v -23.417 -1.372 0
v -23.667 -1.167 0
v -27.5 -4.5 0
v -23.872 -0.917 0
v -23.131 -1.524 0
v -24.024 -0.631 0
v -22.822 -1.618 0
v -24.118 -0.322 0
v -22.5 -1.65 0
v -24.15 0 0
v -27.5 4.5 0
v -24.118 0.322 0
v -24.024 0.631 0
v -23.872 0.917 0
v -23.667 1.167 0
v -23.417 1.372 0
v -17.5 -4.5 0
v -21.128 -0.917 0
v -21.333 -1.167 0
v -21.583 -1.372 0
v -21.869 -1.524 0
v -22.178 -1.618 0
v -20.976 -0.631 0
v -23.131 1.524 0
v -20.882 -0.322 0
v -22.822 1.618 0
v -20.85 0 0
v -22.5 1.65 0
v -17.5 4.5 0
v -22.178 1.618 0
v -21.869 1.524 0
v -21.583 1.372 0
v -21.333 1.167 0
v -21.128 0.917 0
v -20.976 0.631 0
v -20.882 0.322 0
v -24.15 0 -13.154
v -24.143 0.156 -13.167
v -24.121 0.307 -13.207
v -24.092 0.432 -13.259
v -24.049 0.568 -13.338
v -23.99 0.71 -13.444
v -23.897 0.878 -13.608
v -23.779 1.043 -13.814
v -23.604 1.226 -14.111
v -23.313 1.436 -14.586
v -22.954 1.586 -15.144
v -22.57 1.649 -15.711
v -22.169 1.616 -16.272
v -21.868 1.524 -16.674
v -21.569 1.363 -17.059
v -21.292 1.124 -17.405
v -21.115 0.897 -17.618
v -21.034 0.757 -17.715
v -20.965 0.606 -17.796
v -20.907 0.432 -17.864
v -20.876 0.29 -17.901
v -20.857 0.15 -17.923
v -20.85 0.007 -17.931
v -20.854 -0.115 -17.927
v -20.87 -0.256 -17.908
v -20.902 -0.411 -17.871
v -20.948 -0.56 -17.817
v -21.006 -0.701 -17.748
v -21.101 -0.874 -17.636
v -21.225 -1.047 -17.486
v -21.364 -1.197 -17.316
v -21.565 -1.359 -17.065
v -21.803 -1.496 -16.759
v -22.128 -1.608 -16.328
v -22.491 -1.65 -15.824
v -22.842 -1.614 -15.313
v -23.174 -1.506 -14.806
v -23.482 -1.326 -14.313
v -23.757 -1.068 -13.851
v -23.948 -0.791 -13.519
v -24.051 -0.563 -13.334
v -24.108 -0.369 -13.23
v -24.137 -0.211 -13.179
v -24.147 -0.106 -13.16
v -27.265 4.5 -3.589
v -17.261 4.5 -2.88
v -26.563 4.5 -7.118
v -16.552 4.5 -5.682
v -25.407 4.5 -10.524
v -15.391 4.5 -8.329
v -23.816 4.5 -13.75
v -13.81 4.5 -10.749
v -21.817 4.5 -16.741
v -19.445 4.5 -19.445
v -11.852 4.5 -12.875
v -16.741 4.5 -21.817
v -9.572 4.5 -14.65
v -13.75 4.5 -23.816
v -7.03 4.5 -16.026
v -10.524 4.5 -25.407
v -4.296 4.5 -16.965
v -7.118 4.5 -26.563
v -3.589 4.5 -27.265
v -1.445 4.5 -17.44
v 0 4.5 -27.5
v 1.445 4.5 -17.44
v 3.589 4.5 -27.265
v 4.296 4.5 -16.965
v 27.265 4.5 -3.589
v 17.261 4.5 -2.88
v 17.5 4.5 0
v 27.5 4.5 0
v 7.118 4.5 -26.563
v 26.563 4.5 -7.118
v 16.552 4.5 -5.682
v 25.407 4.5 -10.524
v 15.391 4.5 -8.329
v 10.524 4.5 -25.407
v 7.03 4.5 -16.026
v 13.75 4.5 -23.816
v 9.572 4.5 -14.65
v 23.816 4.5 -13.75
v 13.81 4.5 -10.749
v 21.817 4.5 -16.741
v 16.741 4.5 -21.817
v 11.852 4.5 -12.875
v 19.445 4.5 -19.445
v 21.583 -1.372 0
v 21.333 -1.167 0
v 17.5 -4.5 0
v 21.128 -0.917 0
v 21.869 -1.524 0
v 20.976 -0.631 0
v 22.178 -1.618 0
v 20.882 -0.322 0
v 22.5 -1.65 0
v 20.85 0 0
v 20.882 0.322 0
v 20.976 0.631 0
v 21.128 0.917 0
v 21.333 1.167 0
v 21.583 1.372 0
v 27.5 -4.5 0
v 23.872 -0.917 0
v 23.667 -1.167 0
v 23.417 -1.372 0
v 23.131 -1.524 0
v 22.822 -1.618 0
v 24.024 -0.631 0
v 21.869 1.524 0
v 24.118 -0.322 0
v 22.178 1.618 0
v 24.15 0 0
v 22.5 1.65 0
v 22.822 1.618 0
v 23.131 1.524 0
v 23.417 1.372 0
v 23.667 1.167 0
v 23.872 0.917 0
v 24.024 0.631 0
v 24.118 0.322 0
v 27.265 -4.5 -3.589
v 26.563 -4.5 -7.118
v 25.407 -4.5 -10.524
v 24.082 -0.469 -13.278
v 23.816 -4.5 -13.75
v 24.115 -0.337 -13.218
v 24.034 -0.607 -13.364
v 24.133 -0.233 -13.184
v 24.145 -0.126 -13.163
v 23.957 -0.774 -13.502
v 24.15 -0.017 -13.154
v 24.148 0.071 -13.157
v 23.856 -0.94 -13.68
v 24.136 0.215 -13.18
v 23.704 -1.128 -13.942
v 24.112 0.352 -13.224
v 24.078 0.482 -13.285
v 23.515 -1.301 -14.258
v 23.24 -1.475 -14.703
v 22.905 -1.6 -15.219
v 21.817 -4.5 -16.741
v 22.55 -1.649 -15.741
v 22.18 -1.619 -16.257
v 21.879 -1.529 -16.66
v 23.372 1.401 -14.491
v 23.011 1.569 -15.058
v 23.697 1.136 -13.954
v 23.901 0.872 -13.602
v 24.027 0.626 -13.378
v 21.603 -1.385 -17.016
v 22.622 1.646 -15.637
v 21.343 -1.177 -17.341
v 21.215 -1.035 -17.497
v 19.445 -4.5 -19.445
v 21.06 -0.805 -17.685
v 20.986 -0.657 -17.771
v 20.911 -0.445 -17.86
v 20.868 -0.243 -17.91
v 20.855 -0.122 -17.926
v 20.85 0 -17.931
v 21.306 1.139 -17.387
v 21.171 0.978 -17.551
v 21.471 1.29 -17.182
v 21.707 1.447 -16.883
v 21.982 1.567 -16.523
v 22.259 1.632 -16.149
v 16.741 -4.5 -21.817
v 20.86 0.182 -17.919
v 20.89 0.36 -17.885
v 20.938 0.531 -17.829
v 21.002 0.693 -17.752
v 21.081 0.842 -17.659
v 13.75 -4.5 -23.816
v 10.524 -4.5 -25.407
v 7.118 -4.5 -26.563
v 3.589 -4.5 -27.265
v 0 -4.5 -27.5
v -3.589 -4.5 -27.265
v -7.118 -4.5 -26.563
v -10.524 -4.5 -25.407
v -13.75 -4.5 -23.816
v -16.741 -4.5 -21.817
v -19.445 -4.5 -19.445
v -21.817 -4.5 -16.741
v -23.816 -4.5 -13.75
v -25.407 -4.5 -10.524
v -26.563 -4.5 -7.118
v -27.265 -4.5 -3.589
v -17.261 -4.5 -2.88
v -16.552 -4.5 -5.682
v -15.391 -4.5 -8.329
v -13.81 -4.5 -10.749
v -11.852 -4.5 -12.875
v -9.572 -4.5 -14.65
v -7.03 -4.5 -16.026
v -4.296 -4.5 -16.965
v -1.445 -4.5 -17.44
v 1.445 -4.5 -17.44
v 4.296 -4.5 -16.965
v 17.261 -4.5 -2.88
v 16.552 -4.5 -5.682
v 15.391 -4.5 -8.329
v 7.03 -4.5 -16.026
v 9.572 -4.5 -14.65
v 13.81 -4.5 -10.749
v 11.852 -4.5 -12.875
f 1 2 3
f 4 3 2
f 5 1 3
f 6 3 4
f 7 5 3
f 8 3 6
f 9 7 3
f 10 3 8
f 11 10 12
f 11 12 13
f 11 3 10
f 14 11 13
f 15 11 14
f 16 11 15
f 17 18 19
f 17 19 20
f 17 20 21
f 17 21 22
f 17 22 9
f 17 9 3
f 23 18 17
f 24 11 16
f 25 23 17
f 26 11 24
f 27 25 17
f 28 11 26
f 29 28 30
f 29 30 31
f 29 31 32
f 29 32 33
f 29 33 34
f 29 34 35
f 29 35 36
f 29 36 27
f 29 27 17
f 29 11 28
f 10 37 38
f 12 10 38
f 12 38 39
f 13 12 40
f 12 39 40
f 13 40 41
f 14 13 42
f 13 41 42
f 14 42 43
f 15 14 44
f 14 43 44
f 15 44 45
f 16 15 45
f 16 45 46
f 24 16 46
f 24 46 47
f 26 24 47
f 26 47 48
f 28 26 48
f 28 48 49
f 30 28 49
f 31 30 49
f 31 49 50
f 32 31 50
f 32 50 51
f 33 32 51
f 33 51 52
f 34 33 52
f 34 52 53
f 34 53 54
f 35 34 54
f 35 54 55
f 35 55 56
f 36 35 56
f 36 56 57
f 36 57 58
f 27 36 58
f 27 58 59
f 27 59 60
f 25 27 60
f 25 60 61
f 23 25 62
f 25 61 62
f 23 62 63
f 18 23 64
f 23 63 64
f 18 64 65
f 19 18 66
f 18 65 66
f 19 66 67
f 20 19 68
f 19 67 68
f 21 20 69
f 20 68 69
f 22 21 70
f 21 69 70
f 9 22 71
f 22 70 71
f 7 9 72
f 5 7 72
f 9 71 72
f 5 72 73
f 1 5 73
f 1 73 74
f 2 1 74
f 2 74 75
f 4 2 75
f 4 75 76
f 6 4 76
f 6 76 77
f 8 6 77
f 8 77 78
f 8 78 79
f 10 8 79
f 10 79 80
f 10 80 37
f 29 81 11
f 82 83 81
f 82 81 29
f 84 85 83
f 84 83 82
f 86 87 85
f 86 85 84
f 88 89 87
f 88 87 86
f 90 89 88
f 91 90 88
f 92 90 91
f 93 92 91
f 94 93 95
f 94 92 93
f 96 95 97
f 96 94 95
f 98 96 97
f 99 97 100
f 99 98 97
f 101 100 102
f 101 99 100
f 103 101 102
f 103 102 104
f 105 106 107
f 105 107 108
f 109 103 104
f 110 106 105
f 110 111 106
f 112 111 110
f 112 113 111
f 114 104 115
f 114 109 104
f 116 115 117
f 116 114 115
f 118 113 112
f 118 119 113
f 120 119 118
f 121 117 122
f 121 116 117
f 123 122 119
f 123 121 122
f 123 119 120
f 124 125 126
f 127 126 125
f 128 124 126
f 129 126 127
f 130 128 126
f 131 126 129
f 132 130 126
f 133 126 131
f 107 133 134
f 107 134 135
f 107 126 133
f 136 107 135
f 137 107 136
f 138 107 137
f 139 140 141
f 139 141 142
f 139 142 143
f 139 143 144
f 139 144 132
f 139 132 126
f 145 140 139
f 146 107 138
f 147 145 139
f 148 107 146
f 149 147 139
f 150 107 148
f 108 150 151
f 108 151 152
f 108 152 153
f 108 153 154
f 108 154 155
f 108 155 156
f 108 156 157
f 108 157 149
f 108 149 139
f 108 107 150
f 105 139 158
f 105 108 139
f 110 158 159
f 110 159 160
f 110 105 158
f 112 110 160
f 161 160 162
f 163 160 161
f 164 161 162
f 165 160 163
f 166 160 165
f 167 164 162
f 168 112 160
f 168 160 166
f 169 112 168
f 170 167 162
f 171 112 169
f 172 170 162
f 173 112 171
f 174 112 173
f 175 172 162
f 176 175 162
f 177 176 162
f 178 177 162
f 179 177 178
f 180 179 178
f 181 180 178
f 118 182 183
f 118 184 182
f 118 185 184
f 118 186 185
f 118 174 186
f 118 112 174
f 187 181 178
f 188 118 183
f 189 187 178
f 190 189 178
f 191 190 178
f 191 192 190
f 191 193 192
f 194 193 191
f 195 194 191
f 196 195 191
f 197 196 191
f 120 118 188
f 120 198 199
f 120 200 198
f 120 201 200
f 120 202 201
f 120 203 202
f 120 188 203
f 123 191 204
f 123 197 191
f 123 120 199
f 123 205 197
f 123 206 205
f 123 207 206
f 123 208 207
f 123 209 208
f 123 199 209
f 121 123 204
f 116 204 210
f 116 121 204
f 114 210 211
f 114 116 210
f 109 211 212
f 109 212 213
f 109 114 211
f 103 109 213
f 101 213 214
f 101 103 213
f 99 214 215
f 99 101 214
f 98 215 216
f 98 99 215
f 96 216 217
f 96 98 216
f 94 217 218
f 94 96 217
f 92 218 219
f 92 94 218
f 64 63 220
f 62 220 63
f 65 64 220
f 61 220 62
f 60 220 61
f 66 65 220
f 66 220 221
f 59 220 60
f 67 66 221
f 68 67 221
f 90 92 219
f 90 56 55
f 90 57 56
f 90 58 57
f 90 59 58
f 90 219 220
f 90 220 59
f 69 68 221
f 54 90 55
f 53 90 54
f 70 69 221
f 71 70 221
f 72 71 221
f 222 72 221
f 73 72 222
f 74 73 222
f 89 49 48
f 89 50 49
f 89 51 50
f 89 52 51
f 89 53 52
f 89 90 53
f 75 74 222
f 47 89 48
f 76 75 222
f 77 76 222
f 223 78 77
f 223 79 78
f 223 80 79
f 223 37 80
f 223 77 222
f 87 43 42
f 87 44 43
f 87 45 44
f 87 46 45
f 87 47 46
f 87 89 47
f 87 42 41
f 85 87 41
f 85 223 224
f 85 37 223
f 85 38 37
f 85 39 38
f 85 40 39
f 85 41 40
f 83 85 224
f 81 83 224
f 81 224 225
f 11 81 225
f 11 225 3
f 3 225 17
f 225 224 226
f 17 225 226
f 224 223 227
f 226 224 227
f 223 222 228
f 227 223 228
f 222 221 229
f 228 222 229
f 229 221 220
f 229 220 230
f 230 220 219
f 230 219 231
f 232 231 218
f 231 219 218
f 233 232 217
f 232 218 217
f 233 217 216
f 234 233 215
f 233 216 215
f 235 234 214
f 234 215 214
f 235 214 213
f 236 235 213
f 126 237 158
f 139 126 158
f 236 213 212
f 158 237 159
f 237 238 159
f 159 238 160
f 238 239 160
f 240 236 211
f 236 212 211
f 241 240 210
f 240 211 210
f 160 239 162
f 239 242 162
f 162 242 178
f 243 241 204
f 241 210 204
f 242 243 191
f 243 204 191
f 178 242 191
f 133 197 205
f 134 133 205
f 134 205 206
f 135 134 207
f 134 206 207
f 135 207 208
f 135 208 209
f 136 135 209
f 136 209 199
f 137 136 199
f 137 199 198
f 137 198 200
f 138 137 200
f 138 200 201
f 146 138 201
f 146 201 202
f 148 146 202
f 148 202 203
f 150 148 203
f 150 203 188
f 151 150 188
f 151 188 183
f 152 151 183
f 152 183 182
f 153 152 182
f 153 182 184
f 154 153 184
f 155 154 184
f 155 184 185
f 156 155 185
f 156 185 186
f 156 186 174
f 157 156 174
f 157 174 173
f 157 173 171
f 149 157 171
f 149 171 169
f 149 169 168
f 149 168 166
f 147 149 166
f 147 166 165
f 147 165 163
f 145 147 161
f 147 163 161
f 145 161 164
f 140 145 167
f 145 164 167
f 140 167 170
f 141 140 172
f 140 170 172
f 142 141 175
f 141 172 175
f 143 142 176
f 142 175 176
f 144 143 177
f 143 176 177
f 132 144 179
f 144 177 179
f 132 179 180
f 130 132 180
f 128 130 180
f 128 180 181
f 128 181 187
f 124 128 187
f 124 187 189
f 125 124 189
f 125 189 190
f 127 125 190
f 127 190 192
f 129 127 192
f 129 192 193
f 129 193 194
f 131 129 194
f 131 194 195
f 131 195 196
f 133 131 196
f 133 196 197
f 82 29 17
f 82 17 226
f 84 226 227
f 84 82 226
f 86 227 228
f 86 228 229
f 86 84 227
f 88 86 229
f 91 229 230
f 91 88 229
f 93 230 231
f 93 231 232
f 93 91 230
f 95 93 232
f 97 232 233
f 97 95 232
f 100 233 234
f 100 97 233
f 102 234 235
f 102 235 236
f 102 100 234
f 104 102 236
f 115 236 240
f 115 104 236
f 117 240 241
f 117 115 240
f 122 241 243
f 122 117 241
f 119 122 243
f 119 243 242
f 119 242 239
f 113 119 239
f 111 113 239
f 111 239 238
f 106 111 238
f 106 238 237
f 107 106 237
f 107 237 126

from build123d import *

# Parameters (mm, degrees)
BOSS_EXTRUDE1_DEPTH         = 4.5
TAP_DRILL_FOR_M4X0_7_TAP1_D = 3.3


with BuildPart() as part:
    # Sketch1 → Boss-Extrude1 (new body, symmetric)
    with BuildSketch(Plane(origin=(0, 0, 0), x_dir=(1, 0, 0), z_dir=(0, 1, 0))):
        with BuildLine():
            Line((-27.5, 0), (-17.5, 0))
            ThreePointArc((-17.5, 0), (0, 17.5), (17.5, 0))
            Line((17.5, 0), (27.5, 0))
            ThreePointArc((27.5, 0), (0, 27.5), (-27.5, 0))
        make_face()
    extrude(amount=BOSS_EXTRUDE1_DEPTH, both=True)

    # Tap Drill for M4x0.7 Tap1 (through all)
    with Locations(Plane(origin=(22.5, 0, 0), x_dir=(1, 0, 0), z_dir=(0, 0, 1))):
        with Locations((0, 0), (-45, 0)):
            Hole(TAP_DRILL_FOR_M4X0_7_TAP1_D / 2)


solid = part.part
